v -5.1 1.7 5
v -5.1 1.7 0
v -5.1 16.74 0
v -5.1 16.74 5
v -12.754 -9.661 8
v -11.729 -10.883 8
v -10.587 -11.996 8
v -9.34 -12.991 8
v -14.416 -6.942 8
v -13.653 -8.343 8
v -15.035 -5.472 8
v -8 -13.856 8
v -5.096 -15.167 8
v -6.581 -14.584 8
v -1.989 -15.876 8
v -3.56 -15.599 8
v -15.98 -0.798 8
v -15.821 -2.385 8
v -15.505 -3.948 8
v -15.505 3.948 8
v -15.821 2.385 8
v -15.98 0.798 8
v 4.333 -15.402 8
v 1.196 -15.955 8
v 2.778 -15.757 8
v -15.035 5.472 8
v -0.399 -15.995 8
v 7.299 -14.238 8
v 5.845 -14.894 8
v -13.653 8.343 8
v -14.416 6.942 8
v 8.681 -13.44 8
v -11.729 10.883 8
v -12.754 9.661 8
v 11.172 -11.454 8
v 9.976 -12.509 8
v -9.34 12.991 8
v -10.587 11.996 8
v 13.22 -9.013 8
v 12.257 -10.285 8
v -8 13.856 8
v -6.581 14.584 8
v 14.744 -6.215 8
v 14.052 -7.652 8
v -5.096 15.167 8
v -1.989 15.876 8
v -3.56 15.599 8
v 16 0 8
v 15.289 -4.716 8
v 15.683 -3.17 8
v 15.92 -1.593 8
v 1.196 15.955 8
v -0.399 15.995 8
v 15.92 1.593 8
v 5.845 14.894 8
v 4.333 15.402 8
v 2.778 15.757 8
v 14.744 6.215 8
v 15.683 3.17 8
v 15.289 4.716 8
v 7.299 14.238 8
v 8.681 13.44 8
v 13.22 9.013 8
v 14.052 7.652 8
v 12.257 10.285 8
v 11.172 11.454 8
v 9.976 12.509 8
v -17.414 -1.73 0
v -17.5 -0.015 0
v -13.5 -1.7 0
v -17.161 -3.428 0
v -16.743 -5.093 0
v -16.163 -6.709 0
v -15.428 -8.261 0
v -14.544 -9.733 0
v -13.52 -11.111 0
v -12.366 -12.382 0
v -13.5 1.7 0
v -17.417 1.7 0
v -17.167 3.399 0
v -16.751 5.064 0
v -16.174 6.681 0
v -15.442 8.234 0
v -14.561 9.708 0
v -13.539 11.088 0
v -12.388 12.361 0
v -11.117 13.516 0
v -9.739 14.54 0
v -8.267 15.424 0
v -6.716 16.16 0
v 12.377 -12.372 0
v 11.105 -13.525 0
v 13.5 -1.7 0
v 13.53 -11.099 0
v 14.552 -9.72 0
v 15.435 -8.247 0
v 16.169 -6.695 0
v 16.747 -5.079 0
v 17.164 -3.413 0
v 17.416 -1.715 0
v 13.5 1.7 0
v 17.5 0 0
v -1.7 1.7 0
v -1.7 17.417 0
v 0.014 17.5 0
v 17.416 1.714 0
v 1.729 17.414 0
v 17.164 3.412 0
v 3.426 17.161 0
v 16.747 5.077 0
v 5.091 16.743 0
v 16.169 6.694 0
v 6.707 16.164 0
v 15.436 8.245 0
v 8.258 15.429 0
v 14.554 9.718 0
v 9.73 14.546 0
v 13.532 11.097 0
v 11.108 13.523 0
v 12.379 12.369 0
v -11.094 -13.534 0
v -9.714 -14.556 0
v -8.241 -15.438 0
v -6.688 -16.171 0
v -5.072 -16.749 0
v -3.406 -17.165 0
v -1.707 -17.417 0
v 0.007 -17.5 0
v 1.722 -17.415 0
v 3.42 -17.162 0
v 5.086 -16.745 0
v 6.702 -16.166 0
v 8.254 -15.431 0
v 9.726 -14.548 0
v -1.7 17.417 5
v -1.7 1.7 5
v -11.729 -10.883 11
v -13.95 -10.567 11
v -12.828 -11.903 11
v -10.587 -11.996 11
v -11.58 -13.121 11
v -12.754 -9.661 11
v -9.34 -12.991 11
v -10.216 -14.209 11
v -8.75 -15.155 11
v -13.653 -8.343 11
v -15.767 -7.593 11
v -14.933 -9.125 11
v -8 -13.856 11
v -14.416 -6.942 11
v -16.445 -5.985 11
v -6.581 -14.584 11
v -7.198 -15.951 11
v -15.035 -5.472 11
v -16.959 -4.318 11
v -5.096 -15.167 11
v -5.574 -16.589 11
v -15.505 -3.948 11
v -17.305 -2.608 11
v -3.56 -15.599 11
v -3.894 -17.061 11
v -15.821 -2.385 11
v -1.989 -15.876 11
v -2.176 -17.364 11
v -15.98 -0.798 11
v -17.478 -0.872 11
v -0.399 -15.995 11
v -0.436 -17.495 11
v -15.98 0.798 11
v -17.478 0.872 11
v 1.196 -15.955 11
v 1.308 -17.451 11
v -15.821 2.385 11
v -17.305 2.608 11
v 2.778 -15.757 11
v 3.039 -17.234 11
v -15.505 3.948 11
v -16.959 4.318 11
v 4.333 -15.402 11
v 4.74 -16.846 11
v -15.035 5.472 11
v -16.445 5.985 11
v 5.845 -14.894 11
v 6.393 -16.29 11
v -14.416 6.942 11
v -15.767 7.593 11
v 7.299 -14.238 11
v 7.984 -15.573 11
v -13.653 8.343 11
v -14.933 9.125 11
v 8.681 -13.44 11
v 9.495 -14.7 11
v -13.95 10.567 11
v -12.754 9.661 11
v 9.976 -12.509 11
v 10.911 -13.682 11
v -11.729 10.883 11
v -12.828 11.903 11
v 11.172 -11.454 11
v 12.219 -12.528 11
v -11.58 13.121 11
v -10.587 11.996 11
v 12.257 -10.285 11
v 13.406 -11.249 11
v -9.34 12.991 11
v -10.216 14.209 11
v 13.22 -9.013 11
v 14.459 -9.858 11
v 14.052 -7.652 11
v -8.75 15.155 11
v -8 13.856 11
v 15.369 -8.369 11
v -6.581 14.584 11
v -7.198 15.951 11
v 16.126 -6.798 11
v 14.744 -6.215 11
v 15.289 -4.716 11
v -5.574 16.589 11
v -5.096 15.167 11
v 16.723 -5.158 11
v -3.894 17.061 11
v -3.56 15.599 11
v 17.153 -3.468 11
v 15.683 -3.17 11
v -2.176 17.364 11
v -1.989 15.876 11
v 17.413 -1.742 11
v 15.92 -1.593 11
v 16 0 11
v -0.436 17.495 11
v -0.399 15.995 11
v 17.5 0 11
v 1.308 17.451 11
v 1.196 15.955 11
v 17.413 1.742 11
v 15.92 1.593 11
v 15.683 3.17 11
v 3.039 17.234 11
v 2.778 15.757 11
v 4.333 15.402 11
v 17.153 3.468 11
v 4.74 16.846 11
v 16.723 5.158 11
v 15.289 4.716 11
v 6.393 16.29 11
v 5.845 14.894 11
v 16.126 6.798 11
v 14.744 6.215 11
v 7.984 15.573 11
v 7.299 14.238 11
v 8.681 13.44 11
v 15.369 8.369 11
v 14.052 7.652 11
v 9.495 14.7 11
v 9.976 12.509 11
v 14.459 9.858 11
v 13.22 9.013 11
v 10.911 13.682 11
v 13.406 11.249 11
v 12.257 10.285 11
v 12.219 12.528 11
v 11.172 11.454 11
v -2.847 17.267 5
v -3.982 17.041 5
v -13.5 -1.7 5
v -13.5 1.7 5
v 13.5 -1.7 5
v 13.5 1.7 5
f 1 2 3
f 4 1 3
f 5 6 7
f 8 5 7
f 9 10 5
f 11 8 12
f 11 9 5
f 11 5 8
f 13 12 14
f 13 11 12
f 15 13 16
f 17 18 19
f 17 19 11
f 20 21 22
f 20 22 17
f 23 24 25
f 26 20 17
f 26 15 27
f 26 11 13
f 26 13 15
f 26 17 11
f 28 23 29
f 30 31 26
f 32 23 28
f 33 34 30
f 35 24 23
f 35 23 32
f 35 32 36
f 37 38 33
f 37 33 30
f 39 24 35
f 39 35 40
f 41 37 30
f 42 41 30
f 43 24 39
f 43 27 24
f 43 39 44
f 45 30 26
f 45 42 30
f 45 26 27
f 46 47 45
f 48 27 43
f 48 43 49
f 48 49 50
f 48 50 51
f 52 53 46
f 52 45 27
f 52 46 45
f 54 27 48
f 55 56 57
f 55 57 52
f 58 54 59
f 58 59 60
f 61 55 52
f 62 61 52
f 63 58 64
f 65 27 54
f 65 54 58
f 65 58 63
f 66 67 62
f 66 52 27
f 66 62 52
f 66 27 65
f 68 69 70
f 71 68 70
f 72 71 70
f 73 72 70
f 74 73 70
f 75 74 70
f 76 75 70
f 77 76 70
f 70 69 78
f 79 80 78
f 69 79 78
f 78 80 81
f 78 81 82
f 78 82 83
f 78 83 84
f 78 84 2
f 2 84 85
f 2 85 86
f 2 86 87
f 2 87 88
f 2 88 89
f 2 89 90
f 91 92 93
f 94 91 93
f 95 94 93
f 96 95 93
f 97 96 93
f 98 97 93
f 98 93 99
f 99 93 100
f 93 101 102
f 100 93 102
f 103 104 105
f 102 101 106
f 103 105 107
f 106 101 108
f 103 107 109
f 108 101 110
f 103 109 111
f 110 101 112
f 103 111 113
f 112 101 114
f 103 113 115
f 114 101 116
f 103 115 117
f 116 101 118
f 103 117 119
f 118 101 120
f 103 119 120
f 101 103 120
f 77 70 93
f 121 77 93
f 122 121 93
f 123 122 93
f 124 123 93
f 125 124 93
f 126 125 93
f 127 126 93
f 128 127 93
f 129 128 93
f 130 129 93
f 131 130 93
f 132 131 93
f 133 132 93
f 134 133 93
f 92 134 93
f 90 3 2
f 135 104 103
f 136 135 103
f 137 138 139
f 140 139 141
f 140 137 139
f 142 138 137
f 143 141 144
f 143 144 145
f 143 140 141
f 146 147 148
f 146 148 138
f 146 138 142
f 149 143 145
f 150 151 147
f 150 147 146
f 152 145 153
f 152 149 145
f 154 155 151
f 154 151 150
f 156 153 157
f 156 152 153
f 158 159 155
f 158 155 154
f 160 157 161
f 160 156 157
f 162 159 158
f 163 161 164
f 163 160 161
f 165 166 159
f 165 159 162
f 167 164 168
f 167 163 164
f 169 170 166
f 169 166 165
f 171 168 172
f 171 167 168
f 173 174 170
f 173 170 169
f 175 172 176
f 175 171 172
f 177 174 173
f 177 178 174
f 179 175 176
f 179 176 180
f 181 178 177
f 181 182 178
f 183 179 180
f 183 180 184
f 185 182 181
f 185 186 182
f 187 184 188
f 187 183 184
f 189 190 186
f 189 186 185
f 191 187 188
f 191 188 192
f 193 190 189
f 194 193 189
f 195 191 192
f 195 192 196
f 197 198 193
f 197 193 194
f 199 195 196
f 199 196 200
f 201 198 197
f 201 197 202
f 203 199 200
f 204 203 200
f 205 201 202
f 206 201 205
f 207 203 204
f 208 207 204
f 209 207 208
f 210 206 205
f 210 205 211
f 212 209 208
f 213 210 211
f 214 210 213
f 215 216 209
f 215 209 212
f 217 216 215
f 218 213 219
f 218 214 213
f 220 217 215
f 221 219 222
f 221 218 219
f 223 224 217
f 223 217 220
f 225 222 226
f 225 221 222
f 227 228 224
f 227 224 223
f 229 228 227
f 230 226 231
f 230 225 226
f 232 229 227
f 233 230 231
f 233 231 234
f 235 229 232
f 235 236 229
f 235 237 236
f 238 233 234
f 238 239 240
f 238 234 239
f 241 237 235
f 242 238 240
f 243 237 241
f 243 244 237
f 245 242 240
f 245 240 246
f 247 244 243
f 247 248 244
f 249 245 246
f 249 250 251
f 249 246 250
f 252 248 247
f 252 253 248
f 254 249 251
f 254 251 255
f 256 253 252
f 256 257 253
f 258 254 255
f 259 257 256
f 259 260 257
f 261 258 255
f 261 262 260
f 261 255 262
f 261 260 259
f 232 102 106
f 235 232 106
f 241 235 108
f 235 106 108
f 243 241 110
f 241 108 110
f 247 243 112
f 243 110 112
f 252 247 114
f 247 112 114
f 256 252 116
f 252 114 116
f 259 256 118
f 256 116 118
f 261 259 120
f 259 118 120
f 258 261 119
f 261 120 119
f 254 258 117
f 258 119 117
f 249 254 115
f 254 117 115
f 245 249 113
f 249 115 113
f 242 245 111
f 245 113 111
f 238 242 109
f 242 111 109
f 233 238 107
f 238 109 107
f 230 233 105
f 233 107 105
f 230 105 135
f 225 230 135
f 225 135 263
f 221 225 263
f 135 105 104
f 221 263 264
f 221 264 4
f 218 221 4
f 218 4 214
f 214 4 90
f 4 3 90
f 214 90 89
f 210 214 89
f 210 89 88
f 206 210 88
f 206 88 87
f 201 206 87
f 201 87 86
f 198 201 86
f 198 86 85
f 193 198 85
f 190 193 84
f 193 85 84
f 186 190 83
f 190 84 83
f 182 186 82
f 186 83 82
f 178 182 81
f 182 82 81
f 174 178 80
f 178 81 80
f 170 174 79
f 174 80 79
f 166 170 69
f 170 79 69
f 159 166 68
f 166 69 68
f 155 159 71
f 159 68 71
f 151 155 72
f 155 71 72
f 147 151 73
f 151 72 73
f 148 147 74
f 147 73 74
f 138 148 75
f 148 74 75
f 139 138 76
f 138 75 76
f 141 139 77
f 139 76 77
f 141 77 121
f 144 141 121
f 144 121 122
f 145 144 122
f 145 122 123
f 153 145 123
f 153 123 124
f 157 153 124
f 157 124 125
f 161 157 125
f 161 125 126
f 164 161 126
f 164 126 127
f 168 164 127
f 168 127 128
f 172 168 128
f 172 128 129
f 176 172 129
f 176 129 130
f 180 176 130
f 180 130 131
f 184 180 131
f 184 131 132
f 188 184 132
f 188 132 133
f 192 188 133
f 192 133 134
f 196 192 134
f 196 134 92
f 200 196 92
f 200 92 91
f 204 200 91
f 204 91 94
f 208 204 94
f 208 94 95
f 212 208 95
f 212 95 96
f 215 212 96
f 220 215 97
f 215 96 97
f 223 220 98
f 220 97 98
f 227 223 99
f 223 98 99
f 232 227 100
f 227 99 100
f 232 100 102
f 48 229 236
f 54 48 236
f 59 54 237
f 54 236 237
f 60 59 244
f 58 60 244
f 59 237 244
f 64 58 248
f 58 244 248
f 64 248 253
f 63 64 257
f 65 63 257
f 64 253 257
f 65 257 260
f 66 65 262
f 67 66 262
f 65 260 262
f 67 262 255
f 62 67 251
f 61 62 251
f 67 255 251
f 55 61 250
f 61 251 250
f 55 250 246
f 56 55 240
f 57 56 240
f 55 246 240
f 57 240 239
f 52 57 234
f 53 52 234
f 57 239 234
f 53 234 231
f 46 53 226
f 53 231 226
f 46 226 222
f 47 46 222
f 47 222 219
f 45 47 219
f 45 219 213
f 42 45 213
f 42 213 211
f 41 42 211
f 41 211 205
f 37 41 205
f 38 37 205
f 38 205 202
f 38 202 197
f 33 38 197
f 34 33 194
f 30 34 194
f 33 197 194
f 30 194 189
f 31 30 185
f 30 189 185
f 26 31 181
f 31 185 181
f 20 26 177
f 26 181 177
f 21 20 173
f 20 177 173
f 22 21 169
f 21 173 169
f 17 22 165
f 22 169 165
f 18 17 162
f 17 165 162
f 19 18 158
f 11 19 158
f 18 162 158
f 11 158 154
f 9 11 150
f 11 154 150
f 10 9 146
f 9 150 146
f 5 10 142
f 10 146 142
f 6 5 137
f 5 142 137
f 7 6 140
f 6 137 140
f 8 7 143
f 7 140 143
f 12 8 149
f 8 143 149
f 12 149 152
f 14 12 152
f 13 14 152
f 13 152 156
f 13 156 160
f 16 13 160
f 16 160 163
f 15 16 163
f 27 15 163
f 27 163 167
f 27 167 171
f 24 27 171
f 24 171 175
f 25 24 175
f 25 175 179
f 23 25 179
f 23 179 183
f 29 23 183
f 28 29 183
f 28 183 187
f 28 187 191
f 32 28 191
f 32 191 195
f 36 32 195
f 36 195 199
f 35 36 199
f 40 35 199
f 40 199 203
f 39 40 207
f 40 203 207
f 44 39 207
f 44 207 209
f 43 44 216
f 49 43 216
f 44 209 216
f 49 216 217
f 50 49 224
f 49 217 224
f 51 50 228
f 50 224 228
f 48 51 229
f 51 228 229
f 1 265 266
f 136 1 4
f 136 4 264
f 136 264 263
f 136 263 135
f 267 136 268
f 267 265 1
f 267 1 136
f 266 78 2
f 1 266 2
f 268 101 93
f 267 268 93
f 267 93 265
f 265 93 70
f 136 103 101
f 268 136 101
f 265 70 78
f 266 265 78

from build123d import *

# Parameters (mm, degrees)
F0_R     = 17.5
F1_DEPTH = 11
F2_R     = 16
F3_DEPTH = 3
F4_W     = 13.5
F4_H     = 1.7
F5_DEPTH = 5


with BuildPart() as f1:
    # F0 (on Top) → F1 (new body)
    with BuildSketch(Plane.XY):
        Circle(F0_R)
    extrude(amount=F1_DEPTH)

    # F2 (on face) → F3 (cut)
    with BuildSketch(Plane.XY.offset(11)):
        Circle(F2_R)
    extrude(amount=-F3_DEPTH, mode=Mode.SUBTRACT)

    # F4 (on face) → F5 (cut)
    with BuildSketch(Plane(origin=(0, 0, 0), x_dir=(1, 0, 0), z_dir=(0, 0, -1))):
        with BuildLine():
            Line((-1.7, -17.4172328457), (-1.7, -1.7))
            Line((-1.7, -1.7), (-5.1, -1.7))
            Line((-5.1, -1.7), (-5.1, -16.7403703663))
            ThreePointArc((-5.1, -16.7403703663), (-3.4168019703, -17.1632008756), (-1.7, -17.4172328457))
        make_face()
        Polygon((0, -1.7), (0, 0), (-13.5, 0), (-13.5, -1.7), (-5.1, -1.7), (-1.7, -1.7), align=None)
        Polygon((13.5, 0), (0, 0), (0, -1.7), (1.7, -1.7), (13.5, -1.7), align=None)
        with Locations((6.75, 0.85)):
            Rectangle(F4_W, F4_H)
        with Locations((-6.75, 0.85)):
            Rectangle(F4_W, F4_H)
    extrude(amount=-F5_DEPTH, mode=Mode.SUBTRACT)


solid = f1.part
